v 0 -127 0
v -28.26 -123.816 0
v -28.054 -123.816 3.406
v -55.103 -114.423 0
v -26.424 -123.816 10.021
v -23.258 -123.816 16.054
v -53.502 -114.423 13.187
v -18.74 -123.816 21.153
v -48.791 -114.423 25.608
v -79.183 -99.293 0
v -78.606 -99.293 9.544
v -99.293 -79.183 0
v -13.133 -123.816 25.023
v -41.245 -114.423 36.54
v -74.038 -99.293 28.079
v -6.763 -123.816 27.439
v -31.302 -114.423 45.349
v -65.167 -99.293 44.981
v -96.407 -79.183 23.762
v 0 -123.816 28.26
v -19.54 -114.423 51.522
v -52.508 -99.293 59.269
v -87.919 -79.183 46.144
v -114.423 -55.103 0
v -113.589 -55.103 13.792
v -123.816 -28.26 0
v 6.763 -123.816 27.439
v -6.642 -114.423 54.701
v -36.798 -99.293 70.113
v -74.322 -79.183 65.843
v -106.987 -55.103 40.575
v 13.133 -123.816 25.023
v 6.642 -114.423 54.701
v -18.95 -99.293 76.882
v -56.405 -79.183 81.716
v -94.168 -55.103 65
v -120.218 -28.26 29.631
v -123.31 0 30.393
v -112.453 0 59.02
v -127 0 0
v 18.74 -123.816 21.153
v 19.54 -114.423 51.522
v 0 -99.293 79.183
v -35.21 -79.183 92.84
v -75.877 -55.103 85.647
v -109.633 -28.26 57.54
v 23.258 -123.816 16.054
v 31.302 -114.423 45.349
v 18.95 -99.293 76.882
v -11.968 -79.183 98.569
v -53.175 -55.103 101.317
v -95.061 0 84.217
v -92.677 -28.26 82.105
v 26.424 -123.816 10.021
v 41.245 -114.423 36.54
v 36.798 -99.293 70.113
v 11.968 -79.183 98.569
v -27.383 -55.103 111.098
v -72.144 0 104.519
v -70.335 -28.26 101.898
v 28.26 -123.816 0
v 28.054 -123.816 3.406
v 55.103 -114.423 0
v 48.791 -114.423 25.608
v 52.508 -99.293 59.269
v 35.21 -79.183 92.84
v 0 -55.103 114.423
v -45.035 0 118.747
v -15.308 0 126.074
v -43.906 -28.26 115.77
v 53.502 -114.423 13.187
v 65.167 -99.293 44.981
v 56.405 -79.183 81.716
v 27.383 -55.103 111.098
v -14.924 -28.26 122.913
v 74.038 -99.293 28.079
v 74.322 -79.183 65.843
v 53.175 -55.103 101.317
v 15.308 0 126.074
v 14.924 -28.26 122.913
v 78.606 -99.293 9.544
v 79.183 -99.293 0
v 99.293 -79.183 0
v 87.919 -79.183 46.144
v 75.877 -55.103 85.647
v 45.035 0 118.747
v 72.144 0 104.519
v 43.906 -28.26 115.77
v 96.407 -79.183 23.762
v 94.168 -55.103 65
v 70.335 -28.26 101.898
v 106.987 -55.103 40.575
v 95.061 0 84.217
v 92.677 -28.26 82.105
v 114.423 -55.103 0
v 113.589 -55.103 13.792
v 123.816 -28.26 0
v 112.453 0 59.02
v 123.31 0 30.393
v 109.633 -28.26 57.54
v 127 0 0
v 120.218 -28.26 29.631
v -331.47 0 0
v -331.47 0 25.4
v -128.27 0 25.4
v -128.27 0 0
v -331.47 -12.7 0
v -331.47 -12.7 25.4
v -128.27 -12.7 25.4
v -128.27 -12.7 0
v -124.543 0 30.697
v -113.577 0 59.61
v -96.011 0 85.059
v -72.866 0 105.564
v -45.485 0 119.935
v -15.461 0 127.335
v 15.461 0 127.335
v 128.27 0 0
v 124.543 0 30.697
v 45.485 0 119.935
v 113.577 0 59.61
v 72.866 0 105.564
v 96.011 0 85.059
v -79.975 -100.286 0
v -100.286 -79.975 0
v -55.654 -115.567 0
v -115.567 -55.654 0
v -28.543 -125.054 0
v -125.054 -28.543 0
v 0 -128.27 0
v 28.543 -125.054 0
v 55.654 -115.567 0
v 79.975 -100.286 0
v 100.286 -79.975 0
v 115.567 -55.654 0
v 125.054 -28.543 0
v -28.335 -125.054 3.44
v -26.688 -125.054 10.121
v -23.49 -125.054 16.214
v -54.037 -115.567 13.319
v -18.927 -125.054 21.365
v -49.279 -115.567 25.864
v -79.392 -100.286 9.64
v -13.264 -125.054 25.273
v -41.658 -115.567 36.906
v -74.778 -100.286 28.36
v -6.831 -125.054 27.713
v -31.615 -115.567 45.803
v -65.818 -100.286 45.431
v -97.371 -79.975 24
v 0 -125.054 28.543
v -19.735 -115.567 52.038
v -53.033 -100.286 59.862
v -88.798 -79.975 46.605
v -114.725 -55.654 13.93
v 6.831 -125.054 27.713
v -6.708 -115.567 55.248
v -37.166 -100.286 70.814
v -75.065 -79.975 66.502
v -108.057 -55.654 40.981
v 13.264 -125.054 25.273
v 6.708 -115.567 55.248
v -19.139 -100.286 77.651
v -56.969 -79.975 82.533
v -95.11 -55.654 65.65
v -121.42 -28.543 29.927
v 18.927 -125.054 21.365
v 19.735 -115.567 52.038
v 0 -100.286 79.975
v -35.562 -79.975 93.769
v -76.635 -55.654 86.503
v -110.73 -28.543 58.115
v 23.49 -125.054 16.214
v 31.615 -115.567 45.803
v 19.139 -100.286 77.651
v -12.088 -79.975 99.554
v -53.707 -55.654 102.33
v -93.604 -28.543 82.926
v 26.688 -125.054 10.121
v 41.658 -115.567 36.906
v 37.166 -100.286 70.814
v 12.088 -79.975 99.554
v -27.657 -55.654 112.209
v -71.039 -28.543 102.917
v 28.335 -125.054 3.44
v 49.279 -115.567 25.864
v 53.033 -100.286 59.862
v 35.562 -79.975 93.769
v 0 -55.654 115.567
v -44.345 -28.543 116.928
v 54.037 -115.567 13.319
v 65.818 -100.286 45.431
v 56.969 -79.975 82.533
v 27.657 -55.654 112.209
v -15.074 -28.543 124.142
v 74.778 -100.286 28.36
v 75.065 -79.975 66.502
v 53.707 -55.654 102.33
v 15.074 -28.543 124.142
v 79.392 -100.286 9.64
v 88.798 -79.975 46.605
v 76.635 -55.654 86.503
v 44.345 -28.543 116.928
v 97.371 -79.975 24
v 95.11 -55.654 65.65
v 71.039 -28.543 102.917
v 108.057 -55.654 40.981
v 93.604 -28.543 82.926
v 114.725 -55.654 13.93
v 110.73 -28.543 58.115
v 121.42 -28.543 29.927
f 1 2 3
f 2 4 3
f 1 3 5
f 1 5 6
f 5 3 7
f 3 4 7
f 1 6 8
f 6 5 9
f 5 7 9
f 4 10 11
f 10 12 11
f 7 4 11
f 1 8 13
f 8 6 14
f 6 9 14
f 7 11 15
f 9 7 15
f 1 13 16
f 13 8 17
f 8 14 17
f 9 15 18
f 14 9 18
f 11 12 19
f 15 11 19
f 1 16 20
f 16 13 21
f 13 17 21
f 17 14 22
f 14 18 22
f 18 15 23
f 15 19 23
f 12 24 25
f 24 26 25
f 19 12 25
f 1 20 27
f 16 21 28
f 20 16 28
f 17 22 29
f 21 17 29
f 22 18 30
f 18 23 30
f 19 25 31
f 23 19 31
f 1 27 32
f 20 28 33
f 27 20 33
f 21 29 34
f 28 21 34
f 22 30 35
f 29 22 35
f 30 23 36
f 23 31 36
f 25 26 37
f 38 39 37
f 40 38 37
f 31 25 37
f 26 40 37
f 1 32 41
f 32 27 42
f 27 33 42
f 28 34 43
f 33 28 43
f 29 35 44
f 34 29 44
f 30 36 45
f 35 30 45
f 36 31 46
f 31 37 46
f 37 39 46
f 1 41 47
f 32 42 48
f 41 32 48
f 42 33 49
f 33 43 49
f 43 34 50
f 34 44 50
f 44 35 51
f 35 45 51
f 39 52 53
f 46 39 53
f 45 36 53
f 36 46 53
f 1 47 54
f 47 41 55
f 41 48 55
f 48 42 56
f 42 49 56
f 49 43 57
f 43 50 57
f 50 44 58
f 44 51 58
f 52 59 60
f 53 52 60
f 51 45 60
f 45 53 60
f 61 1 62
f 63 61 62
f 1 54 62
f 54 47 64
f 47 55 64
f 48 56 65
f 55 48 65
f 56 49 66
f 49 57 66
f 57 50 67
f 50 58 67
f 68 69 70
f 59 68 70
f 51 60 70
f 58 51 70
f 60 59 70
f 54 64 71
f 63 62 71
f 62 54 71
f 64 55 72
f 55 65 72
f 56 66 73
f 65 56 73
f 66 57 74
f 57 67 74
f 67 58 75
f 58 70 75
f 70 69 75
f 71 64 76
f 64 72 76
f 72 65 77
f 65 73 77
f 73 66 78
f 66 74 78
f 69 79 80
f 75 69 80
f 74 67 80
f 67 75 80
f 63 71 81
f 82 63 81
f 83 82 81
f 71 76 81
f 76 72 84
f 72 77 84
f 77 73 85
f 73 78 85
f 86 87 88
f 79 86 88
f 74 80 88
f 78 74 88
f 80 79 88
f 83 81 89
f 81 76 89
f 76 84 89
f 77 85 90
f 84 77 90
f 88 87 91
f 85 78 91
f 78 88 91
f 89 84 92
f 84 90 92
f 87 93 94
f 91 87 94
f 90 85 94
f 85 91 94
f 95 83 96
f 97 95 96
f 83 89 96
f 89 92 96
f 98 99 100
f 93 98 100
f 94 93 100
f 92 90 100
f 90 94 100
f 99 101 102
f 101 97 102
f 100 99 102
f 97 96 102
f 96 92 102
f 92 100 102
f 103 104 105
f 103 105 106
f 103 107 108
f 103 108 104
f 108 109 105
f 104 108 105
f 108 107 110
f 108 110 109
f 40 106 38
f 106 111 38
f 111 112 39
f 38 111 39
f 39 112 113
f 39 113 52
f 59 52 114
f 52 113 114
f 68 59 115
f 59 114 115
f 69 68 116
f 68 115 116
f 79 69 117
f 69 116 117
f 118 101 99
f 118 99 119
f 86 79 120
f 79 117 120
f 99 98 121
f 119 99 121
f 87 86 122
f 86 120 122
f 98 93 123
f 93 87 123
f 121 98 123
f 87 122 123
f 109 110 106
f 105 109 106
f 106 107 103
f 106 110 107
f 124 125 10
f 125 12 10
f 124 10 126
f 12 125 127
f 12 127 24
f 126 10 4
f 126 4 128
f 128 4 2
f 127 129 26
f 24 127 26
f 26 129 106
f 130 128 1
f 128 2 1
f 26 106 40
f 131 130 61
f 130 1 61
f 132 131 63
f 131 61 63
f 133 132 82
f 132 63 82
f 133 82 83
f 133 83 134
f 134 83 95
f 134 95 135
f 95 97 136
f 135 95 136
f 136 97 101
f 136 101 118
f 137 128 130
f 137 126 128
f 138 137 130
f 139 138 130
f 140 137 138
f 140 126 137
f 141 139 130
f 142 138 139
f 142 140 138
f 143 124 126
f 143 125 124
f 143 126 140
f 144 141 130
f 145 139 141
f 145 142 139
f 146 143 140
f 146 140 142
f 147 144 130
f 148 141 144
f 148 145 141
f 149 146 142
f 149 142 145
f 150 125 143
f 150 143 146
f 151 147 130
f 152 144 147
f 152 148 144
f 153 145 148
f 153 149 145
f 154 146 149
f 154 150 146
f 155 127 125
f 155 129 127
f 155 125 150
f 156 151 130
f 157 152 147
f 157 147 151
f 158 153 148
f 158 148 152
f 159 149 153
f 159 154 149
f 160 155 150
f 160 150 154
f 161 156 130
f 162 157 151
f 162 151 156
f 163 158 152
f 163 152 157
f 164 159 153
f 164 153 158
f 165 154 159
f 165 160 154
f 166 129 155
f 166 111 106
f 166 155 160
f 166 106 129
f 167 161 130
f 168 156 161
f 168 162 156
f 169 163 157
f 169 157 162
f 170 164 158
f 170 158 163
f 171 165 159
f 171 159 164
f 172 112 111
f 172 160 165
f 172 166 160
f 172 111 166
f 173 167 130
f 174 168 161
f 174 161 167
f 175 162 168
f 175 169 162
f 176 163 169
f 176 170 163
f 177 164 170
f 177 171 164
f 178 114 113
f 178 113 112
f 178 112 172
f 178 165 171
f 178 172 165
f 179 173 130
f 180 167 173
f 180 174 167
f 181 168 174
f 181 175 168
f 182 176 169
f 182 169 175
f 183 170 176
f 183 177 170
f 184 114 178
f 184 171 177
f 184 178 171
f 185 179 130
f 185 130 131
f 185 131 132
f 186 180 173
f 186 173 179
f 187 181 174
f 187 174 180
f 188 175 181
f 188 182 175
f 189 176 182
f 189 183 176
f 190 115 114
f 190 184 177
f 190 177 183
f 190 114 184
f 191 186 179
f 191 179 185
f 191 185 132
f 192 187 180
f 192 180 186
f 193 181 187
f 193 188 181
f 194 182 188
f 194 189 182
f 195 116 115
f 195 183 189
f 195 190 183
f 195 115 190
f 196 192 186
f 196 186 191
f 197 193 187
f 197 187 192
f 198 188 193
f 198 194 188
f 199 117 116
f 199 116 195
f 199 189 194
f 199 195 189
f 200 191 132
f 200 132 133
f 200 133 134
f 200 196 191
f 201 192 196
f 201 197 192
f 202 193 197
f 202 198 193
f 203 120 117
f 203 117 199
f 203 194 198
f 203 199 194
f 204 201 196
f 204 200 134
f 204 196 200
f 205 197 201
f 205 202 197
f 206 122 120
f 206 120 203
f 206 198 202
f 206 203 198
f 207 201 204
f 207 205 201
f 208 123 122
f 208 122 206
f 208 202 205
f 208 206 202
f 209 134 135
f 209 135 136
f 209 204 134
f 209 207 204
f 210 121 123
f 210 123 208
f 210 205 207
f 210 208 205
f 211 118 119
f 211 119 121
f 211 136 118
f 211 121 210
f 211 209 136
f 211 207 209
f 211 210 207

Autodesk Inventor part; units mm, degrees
ref_plane "XZ Plane" through (0, 0, 0) normal (0, 1, 0) x (-1, 0, 0)
ref_plane "XY Plane" through (0, 0, 0) normal (0, 0, 1) x (1, 0, 0)
sketch "Sketch1" plane through (0, 0, 0) normal (0, 0, 1) x (1, 0, 0)
  arc A0 (0, -127) -> (127, 0) centre (0, 0) ccw
  arc A1 (0, -128.27) -> (128.27, 0) centre (0, 0) ccw
  line L0 (127, 0) -> (128.27, 0)
  line L1 (0, -127) -> (0, -128.27)
  line L2 (0, -185.8027) -> (0, 30.9671) projected
  dimension "d0" = 254
  dimension "d1" = 256.54
revolve "Revolution1" add sketch "Sketch1" angle 180 about axis through (0, -10, 0) along (0, -1, 0)
ref_plane "Work Plane1" through (-128.27, 0, 0) normal (1, 0, 0) x (0, 1, 0)
sketch "Sketch2" plane through (-128.27, 0, 0) normal (1, 0, 0) x (0, 1, 0)
  line L0 (-127, 0) -> (0, 0) projected
  line L1 (0, 0) -> (-12.7, 0)
  line L2 (-12.7, 0) -> (-12.7, 25.4)
  line L3 (-12.7, 25.4) -> (0, 25.4)
  line L4 (0, 25.4) -> (0, 0)
  dimension "d3" = 25.4
  dimension "d4" = 12.7
extrude "Extrusion1" add sketch "Sketch2" against normal blind 203.2
properties part number "oneHalfSaladBowl"
